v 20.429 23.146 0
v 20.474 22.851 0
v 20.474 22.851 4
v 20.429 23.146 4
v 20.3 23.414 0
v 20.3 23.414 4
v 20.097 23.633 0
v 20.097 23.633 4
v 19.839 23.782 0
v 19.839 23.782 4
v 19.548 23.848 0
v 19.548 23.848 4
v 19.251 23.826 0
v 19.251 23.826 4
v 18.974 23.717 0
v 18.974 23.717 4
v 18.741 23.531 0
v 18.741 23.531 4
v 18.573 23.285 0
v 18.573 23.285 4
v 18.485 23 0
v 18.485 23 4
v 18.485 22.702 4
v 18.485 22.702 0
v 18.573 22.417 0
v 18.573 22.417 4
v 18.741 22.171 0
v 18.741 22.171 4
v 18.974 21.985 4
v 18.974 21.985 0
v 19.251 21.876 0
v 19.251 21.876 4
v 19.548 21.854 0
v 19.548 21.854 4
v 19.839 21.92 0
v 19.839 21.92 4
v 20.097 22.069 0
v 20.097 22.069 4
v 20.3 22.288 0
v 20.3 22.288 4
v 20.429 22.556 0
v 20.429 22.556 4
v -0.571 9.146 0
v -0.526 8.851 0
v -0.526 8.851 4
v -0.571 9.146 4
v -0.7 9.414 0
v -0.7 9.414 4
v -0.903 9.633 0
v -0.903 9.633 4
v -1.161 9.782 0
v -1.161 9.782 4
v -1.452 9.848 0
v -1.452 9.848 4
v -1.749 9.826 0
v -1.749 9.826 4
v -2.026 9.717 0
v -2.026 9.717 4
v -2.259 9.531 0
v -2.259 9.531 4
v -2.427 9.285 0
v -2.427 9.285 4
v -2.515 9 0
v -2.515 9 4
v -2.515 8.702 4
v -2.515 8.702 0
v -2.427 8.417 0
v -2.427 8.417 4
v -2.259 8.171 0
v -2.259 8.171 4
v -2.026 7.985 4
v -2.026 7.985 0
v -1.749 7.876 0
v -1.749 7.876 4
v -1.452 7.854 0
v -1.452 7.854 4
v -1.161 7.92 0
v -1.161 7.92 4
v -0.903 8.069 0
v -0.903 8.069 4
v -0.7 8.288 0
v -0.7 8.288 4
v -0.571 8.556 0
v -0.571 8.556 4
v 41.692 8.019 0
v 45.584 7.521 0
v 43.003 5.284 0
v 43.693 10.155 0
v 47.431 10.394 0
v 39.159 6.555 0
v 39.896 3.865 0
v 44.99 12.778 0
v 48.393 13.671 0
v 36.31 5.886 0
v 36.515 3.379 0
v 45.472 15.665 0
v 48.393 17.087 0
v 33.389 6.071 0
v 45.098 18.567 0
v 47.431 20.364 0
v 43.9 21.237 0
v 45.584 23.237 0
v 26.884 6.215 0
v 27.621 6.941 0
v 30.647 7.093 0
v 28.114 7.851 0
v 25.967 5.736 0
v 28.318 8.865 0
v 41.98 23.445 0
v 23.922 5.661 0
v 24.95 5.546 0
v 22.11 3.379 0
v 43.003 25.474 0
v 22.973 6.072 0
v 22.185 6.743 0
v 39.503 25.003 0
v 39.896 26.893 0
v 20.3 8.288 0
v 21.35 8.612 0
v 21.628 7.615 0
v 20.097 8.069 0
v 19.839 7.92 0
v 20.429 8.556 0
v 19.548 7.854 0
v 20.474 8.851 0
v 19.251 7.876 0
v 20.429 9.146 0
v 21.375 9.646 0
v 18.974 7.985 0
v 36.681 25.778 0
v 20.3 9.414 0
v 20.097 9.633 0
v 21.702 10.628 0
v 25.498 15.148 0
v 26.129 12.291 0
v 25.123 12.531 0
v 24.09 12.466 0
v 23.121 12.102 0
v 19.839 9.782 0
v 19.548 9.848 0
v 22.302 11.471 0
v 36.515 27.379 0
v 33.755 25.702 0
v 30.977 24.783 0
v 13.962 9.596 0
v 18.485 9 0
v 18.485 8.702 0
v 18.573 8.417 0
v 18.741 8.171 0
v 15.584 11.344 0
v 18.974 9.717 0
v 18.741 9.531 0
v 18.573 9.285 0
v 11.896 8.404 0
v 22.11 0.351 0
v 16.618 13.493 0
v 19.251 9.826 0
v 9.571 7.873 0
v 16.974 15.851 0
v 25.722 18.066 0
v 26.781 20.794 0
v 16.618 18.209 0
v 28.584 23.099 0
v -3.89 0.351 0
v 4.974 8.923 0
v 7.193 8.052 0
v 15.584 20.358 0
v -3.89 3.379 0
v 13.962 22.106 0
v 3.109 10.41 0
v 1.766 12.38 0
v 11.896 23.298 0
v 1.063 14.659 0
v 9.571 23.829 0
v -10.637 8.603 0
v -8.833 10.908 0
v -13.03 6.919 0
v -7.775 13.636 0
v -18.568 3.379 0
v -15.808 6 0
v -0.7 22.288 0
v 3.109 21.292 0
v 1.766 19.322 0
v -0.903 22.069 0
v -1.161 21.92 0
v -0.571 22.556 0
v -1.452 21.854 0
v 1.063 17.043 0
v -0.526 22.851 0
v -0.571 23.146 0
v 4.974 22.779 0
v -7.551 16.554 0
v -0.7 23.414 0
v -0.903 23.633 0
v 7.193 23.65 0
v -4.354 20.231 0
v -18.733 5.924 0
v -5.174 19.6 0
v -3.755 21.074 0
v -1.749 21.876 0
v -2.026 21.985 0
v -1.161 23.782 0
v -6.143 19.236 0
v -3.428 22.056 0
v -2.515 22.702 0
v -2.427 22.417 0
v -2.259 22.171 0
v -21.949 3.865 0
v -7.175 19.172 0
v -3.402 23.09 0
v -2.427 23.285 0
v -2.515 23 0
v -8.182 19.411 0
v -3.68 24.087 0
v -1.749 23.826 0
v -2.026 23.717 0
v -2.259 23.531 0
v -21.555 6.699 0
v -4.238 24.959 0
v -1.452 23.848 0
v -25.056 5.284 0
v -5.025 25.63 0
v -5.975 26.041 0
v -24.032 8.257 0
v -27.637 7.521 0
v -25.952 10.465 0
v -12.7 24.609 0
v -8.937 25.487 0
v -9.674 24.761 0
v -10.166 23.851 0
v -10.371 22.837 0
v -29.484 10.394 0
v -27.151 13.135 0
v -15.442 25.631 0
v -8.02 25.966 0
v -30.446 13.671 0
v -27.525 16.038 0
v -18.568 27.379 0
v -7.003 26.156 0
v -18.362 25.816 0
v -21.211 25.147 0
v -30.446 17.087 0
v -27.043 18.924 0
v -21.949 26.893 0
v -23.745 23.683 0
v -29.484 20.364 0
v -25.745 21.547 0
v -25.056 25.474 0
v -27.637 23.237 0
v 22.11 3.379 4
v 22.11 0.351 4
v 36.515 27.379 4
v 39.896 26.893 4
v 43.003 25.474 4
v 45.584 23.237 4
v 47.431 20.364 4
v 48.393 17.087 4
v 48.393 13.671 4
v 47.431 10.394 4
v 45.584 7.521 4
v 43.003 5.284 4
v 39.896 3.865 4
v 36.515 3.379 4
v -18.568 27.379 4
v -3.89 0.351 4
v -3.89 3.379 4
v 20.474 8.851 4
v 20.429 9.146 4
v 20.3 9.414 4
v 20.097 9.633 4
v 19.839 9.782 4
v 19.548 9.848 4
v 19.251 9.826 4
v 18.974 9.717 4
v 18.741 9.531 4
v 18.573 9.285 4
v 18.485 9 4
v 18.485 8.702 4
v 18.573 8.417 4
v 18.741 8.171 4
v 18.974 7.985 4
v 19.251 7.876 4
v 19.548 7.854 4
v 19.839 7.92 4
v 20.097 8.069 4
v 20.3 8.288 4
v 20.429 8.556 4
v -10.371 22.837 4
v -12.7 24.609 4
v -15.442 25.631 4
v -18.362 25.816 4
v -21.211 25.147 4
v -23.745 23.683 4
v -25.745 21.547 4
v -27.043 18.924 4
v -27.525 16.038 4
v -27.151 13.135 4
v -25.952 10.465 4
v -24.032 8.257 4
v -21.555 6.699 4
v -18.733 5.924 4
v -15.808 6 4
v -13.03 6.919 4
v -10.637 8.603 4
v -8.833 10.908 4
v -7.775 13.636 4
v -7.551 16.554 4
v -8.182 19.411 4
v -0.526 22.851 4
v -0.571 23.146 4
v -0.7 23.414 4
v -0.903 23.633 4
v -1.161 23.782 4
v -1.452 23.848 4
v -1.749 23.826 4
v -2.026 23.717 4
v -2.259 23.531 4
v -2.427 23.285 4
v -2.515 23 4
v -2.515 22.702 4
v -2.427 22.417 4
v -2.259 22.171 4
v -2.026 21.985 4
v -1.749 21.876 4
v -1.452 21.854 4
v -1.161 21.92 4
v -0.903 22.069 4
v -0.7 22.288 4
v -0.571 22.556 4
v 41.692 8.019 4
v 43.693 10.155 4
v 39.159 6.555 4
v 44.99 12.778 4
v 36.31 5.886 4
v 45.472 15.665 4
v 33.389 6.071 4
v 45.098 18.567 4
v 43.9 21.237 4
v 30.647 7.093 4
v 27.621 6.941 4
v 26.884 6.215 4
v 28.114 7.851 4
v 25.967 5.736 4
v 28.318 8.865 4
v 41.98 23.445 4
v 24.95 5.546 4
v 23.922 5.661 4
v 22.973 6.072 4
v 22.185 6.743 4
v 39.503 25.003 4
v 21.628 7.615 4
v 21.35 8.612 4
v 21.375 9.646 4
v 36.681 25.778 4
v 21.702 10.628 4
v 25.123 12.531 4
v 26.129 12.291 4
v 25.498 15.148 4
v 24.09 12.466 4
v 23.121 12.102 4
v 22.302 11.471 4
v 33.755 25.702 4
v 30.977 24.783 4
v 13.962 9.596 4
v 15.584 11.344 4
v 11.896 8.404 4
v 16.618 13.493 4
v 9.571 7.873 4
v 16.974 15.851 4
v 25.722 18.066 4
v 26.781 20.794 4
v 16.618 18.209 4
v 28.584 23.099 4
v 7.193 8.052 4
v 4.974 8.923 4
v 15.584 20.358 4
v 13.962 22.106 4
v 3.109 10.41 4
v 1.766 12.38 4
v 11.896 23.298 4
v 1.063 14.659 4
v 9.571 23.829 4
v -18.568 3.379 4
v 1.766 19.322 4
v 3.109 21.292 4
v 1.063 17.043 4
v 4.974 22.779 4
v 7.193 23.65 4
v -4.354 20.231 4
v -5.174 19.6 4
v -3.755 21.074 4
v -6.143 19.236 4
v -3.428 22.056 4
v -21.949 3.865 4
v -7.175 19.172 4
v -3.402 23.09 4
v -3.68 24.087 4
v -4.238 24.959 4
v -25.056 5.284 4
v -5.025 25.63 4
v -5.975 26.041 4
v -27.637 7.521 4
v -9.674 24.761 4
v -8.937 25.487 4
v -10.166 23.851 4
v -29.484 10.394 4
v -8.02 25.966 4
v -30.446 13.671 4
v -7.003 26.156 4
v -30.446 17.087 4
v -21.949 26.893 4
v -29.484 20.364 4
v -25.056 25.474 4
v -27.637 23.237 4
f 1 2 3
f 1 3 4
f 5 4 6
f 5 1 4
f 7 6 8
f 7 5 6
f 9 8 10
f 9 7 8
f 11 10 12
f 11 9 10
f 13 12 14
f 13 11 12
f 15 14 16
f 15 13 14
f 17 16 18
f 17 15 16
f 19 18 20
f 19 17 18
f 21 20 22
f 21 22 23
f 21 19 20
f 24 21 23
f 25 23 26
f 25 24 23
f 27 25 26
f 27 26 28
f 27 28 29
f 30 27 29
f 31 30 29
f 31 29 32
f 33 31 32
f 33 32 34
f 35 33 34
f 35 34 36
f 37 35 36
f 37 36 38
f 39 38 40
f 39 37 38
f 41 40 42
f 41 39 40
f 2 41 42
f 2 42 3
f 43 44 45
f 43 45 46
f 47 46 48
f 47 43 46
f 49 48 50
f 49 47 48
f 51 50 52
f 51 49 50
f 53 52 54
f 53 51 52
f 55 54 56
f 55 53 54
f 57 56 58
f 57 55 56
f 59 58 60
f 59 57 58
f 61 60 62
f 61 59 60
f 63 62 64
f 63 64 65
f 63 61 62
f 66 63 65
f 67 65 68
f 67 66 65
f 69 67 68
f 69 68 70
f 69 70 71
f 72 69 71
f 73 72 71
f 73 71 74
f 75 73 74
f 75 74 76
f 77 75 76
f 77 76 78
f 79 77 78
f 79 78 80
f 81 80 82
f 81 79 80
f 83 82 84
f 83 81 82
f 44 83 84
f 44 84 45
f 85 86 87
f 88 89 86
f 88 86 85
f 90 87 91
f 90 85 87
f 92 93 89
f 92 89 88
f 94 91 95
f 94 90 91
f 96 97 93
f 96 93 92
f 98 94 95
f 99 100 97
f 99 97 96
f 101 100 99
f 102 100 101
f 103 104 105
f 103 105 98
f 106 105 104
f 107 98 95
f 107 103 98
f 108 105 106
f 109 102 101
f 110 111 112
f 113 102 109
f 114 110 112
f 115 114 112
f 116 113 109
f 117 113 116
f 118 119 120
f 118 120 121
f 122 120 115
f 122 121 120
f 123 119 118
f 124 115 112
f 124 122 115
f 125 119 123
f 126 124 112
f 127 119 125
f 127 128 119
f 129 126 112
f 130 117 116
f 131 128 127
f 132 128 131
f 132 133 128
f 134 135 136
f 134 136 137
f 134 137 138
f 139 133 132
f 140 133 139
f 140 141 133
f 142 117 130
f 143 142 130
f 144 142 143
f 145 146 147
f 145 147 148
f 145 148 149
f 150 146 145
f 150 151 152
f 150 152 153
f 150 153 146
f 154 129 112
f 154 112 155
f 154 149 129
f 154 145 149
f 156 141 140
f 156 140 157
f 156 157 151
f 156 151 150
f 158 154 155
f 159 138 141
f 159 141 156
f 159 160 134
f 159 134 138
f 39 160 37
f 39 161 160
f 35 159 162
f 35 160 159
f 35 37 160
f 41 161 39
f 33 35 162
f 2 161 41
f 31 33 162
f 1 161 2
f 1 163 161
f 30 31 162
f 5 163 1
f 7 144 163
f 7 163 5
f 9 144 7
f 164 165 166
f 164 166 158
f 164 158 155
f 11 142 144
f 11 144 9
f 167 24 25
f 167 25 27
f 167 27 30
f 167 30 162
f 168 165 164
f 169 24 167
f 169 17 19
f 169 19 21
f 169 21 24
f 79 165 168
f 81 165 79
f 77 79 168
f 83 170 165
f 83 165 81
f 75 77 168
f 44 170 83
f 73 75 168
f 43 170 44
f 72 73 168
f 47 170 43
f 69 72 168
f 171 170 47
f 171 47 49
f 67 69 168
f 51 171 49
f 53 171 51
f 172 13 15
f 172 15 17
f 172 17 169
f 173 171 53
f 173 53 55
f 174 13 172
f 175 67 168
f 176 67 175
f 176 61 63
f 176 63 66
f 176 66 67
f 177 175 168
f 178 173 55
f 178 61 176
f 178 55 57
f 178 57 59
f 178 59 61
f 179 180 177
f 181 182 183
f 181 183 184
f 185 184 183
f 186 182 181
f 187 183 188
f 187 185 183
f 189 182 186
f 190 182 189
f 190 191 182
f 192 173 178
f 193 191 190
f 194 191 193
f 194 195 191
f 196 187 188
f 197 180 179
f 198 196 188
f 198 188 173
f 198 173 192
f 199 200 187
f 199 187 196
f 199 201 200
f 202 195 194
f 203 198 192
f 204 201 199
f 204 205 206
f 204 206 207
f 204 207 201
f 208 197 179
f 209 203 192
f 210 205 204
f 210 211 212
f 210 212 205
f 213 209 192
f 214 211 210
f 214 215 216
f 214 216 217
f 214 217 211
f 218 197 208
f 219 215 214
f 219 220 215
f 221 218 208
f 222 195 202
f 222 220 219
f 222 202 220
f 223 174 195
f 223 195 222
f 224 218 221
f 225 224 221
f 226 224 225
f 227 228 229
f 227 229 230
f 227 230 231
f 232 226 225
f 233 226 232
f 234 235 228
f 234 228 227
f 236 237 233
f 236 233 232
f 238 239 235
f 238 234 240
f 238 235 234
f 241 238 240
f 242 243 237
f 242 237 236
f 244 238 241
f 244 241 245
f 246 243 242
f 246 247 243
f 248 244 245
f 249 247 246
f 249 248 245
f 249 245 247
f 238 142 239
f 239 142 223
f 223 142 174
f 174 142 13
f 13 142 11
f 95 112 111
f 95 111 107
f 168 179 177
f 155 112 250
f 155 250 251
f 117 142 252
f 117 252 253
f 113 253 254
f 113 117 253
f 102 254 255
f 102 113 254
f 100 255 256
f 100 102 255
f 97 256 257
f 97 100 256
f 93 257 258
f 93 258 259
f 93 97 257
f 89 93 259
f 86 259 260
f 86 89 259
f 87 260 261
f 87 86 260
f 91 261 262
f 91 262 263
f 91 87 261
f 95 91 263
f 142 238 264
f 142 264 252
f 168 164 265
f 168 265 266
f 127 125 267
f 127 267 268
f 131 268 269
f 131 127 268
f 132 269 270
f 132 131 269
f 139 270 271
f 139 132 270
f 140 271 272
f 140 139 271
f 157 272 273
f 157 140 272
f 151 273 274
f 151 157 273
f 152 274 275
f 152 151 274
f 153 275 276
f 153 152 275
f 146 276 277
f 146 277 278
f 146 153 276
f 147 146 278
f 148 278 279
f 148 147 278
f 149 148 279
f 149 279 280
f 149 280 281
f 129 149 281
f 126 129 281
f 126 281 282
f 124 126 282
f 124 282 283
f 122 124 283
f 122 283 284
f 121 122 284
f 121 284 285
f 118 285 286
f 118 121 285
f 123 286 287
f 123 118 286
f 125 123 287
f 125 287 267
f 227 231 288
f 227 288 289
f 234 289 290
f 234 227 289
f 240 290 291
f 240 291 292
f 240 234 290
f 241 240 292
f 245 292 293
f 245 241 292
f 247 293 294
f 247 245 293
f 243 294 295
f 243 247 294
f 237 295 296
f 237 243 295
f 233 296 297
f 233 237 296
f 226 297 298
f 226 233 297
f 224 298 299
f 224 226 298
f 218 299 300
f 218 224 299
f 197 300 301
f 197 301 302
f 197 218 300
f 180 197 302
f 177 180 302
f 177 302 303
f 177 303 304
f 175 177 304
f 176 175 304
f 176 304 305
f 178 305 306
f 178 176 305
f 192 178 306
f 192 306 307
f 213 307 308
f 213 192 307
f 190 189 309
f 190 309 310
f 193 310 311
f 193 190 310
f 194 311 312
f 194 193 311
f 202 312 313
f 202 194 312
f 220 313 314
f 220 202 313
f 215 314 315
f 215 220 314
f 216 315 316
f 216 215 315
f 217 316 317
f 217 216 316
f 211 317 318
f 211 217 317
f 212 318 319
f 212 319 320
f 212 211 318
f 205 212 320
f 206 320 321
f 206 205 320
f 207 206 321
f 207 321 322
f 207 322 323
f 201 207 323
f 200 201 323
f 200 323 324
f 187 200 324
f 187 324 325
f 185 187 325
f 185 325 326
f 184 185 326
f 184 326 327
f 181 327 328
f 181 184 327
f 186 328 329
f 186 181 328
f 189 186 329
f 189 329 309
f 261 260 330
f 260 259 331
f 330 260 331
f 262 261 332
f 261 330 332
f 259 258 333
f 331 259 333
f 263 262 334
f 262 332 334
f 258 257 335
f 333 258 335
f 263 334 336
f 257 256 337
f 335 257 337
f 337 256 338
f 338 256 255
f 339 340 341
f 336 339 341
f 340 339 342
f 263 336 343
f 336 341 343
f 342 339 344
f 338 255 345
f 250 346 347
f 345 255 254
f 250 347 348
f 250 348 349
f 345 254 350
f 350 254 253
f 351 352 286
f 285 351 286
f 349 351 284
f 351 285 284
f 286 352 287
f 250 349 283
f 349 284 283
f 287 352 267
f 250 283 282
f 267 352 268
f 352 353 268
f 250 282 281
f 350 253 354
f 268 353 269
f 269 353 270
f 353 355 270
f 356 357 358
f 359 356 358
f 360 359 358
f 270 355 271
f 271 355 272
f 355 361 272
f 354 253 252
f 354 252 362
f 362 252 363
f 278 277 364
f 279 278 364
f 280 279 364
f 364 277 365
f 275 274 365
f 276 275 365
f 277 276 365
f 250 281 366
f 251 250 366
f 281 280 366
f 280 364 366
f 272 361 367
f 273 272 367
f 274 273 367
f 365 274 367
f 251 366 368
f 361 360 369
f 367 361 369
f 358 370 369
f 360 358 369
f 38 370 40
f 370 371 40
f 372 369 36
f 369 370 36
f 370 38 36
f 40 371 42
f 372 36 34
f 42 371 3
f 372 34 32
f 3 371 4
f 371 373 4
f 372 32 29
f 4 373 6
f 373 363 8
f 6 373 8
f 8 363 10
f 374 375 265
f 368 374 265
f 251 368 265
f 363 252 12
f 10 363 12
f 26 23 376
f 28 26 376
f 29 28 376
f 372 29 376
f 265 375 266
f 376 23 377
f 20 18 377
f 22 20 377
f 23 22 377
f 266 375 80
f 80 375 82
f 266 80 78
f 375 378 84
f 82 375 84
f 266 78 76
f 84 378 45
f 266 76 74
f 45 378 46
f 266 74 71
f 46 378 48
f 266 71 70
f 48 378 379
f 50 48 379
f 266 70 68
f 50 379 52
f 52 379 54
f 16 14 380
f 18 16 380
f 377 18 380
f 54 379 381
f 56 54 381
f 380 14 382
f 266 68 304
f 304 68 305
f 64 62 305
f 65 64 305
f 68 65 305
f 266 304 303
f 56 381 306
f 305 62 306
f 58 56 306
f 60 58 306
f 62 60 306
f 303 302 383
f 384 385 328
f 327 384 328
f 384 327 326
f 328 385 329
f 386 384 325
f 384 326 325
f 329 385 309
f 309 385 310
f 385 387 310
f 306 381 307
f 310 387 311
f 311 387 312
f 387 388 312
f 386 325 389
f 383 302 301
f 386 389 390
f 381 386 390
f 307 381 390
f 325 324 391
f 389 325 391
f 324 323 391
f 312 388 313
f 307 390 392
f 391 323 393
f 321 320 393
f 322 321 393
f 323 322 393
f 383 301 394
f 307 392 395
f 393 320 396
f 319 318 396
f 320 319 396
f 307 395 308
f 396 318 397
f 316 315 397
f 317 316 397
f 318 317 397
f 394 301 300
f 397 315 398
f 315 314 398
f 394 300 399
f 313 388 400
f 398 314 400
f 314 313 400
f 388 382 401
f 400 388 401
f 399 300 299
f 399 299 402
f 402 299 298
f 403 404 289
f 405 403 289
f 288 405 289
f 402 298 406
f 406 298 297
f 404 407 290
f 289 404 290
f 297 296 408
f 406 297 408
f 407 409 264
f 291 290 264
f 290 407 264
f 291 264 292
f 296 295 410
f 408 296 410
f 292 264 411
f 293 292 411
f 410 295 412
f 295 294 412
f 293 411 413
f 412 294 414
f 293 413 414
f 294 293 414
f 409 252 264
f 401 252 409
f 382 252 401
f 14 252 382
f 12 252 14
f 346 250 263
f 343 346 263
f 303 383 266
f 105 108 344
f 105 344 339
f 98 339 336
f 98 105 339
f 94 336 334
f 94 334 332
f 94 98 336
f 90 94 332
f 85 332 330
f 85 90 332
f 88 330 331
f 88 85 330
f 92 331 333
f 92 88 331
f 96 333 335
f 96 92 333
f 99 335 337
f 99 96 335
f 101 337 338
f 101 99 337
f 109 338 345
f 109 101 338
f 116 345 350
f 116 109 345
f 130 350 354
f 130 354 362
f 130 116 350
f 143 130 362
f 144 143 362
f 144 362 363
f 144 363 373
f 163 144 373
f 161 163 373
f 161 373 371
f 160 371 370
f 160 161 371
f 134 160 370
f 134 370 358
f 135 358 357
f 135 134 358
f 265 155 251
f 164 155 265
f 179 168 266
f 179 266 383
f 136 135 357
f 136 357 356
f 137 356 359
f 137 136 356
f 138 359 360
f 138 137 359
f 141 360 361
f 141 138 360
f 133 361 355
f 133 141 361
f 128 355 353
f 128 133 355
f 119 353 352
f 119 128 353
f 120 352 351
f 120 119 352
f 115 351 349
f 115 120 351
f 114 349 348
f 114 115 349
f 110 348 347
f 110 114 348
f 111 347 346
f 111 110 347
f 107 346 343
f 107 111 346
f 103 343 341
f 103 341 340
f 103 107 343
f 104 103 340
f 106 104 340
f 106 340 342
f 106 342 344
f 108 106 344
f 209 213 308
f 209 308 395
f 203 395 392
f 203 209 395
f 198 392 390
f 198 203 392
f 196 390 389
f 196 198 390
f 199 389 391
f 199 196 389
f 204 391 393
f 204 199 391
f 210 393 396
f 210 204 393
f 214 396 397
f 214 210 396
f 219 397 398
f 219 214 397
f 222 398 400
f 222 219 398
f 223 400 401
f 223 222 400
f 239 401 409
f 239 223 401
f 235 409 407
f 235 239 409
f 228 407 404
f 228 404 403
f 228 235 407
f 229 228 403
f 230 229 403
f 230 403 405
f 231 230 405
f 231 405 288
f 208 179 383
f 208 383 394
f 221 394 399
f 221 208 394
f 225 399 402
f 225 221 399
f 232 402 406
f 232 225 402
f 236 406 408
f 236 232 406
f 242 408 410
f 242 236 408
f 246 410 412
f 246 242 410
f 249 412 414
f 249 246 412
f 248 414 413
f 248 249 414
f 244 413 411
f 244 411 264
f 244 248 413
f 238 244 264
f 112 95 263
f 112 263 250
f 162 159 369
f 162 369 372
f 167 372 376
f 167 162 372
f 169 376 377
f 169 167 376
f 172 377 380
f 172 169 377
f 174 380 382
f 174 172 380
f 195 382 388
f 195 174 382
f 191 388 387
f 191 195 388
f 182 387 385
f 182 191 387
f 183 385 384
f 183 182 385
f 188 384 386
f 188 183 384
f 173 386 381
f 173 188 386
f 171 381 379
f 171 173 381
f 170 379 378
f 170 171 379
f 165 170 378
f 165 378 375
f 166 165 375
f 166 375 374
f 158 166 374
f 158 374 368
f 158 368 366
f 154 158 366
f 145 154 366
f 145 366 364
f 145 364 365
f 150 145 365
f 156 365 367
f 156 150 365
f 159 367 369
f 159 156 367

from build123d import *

# Parameters (mm, degrees)
SKETCH2_R           = 1
SKETCH2_R_2         = 8
BOSS_EXTRUDE2_DEPTH = 4


with BuildPart() as part:
    # Sketch2 → Boss-Extrude2 (new body)
    with BuildSketch(Plane.XY):
        with BuildLine():
            Line((-18.567970323, 27.379059863), (36.515267991, 27.379059863))
            ThreePointArc((36.515267991, 27.379059863), (48.515267991, 15.379059863), (36.515267991, 3.379059863))
            Line((36.515267991, 3.379059863), (22.110149126, 3.379059863))
            Line((22.110149126, 3.379059863), (22.110149126, 0.351018879))
            Line((22.110149126, 0.351018879), (-3.889850874, 0.351018879))
            Line((-3.889850874, 0.351018879), (-3.889850874, 3.379059863))
            Line((-3.889850874, 3.379059863), (-18.567970323, 3.379059863))
            ThreePointArc((-18.567970323, 3.379059863), (-30.567970323, 15.379059863), (-18.567970323, 27.379059863))
        make_face()
        with Locations((-1.526351166, 22.851018879)):
            Circle(SKETCH2_R, mode=Mode.SUBTRACT)
        with Locations((19.473648834, 22.851018879)):
            Circle(SKETCH2_R, mode=Mode.SUBTRACT)
        with Locations((-1.526351166, 8.851018879)):
            Circle(SKETCH2_R, mode=Mode.SUBTRACT)
        with Locations((19.473648834, 8.851018879)):
            Circle(SKETCH2_R, mode=Mode.SUBTRACT)
        with Locations((8.973648834, 15.851018879)):
            Circle(SKETCH2_R_2, mode=Mode.SUBTRACT)
        with BuildLine():
            ThreePointArc((-10.371103668, 22.836892714), (-25.952222618, 10.465418608), (-8.181666286, 19.411477345))
            ThreePointArc((-8.181666286, 19.411477345), (-3.926588869, 24.543637074), (-10.371103668, 22.836892714))
        make_face(mode=Mode.SUBTRACT)
        with BuildLine():
            ThreePointArc((28.318401336, 8.865145043), (43.899520286, 21.236619149), (26.128963954, 12.290560412))
            ThreePointArc((26.128963954, 12.290560412), (21.873886537, 7.158400683), (28.318401336, 8.865145043))
        make_face(mode=Mode.SUBTRACT)
    extrude(amount=BOSS_EXTRUDE2_DEPTH)


solid = part.part
